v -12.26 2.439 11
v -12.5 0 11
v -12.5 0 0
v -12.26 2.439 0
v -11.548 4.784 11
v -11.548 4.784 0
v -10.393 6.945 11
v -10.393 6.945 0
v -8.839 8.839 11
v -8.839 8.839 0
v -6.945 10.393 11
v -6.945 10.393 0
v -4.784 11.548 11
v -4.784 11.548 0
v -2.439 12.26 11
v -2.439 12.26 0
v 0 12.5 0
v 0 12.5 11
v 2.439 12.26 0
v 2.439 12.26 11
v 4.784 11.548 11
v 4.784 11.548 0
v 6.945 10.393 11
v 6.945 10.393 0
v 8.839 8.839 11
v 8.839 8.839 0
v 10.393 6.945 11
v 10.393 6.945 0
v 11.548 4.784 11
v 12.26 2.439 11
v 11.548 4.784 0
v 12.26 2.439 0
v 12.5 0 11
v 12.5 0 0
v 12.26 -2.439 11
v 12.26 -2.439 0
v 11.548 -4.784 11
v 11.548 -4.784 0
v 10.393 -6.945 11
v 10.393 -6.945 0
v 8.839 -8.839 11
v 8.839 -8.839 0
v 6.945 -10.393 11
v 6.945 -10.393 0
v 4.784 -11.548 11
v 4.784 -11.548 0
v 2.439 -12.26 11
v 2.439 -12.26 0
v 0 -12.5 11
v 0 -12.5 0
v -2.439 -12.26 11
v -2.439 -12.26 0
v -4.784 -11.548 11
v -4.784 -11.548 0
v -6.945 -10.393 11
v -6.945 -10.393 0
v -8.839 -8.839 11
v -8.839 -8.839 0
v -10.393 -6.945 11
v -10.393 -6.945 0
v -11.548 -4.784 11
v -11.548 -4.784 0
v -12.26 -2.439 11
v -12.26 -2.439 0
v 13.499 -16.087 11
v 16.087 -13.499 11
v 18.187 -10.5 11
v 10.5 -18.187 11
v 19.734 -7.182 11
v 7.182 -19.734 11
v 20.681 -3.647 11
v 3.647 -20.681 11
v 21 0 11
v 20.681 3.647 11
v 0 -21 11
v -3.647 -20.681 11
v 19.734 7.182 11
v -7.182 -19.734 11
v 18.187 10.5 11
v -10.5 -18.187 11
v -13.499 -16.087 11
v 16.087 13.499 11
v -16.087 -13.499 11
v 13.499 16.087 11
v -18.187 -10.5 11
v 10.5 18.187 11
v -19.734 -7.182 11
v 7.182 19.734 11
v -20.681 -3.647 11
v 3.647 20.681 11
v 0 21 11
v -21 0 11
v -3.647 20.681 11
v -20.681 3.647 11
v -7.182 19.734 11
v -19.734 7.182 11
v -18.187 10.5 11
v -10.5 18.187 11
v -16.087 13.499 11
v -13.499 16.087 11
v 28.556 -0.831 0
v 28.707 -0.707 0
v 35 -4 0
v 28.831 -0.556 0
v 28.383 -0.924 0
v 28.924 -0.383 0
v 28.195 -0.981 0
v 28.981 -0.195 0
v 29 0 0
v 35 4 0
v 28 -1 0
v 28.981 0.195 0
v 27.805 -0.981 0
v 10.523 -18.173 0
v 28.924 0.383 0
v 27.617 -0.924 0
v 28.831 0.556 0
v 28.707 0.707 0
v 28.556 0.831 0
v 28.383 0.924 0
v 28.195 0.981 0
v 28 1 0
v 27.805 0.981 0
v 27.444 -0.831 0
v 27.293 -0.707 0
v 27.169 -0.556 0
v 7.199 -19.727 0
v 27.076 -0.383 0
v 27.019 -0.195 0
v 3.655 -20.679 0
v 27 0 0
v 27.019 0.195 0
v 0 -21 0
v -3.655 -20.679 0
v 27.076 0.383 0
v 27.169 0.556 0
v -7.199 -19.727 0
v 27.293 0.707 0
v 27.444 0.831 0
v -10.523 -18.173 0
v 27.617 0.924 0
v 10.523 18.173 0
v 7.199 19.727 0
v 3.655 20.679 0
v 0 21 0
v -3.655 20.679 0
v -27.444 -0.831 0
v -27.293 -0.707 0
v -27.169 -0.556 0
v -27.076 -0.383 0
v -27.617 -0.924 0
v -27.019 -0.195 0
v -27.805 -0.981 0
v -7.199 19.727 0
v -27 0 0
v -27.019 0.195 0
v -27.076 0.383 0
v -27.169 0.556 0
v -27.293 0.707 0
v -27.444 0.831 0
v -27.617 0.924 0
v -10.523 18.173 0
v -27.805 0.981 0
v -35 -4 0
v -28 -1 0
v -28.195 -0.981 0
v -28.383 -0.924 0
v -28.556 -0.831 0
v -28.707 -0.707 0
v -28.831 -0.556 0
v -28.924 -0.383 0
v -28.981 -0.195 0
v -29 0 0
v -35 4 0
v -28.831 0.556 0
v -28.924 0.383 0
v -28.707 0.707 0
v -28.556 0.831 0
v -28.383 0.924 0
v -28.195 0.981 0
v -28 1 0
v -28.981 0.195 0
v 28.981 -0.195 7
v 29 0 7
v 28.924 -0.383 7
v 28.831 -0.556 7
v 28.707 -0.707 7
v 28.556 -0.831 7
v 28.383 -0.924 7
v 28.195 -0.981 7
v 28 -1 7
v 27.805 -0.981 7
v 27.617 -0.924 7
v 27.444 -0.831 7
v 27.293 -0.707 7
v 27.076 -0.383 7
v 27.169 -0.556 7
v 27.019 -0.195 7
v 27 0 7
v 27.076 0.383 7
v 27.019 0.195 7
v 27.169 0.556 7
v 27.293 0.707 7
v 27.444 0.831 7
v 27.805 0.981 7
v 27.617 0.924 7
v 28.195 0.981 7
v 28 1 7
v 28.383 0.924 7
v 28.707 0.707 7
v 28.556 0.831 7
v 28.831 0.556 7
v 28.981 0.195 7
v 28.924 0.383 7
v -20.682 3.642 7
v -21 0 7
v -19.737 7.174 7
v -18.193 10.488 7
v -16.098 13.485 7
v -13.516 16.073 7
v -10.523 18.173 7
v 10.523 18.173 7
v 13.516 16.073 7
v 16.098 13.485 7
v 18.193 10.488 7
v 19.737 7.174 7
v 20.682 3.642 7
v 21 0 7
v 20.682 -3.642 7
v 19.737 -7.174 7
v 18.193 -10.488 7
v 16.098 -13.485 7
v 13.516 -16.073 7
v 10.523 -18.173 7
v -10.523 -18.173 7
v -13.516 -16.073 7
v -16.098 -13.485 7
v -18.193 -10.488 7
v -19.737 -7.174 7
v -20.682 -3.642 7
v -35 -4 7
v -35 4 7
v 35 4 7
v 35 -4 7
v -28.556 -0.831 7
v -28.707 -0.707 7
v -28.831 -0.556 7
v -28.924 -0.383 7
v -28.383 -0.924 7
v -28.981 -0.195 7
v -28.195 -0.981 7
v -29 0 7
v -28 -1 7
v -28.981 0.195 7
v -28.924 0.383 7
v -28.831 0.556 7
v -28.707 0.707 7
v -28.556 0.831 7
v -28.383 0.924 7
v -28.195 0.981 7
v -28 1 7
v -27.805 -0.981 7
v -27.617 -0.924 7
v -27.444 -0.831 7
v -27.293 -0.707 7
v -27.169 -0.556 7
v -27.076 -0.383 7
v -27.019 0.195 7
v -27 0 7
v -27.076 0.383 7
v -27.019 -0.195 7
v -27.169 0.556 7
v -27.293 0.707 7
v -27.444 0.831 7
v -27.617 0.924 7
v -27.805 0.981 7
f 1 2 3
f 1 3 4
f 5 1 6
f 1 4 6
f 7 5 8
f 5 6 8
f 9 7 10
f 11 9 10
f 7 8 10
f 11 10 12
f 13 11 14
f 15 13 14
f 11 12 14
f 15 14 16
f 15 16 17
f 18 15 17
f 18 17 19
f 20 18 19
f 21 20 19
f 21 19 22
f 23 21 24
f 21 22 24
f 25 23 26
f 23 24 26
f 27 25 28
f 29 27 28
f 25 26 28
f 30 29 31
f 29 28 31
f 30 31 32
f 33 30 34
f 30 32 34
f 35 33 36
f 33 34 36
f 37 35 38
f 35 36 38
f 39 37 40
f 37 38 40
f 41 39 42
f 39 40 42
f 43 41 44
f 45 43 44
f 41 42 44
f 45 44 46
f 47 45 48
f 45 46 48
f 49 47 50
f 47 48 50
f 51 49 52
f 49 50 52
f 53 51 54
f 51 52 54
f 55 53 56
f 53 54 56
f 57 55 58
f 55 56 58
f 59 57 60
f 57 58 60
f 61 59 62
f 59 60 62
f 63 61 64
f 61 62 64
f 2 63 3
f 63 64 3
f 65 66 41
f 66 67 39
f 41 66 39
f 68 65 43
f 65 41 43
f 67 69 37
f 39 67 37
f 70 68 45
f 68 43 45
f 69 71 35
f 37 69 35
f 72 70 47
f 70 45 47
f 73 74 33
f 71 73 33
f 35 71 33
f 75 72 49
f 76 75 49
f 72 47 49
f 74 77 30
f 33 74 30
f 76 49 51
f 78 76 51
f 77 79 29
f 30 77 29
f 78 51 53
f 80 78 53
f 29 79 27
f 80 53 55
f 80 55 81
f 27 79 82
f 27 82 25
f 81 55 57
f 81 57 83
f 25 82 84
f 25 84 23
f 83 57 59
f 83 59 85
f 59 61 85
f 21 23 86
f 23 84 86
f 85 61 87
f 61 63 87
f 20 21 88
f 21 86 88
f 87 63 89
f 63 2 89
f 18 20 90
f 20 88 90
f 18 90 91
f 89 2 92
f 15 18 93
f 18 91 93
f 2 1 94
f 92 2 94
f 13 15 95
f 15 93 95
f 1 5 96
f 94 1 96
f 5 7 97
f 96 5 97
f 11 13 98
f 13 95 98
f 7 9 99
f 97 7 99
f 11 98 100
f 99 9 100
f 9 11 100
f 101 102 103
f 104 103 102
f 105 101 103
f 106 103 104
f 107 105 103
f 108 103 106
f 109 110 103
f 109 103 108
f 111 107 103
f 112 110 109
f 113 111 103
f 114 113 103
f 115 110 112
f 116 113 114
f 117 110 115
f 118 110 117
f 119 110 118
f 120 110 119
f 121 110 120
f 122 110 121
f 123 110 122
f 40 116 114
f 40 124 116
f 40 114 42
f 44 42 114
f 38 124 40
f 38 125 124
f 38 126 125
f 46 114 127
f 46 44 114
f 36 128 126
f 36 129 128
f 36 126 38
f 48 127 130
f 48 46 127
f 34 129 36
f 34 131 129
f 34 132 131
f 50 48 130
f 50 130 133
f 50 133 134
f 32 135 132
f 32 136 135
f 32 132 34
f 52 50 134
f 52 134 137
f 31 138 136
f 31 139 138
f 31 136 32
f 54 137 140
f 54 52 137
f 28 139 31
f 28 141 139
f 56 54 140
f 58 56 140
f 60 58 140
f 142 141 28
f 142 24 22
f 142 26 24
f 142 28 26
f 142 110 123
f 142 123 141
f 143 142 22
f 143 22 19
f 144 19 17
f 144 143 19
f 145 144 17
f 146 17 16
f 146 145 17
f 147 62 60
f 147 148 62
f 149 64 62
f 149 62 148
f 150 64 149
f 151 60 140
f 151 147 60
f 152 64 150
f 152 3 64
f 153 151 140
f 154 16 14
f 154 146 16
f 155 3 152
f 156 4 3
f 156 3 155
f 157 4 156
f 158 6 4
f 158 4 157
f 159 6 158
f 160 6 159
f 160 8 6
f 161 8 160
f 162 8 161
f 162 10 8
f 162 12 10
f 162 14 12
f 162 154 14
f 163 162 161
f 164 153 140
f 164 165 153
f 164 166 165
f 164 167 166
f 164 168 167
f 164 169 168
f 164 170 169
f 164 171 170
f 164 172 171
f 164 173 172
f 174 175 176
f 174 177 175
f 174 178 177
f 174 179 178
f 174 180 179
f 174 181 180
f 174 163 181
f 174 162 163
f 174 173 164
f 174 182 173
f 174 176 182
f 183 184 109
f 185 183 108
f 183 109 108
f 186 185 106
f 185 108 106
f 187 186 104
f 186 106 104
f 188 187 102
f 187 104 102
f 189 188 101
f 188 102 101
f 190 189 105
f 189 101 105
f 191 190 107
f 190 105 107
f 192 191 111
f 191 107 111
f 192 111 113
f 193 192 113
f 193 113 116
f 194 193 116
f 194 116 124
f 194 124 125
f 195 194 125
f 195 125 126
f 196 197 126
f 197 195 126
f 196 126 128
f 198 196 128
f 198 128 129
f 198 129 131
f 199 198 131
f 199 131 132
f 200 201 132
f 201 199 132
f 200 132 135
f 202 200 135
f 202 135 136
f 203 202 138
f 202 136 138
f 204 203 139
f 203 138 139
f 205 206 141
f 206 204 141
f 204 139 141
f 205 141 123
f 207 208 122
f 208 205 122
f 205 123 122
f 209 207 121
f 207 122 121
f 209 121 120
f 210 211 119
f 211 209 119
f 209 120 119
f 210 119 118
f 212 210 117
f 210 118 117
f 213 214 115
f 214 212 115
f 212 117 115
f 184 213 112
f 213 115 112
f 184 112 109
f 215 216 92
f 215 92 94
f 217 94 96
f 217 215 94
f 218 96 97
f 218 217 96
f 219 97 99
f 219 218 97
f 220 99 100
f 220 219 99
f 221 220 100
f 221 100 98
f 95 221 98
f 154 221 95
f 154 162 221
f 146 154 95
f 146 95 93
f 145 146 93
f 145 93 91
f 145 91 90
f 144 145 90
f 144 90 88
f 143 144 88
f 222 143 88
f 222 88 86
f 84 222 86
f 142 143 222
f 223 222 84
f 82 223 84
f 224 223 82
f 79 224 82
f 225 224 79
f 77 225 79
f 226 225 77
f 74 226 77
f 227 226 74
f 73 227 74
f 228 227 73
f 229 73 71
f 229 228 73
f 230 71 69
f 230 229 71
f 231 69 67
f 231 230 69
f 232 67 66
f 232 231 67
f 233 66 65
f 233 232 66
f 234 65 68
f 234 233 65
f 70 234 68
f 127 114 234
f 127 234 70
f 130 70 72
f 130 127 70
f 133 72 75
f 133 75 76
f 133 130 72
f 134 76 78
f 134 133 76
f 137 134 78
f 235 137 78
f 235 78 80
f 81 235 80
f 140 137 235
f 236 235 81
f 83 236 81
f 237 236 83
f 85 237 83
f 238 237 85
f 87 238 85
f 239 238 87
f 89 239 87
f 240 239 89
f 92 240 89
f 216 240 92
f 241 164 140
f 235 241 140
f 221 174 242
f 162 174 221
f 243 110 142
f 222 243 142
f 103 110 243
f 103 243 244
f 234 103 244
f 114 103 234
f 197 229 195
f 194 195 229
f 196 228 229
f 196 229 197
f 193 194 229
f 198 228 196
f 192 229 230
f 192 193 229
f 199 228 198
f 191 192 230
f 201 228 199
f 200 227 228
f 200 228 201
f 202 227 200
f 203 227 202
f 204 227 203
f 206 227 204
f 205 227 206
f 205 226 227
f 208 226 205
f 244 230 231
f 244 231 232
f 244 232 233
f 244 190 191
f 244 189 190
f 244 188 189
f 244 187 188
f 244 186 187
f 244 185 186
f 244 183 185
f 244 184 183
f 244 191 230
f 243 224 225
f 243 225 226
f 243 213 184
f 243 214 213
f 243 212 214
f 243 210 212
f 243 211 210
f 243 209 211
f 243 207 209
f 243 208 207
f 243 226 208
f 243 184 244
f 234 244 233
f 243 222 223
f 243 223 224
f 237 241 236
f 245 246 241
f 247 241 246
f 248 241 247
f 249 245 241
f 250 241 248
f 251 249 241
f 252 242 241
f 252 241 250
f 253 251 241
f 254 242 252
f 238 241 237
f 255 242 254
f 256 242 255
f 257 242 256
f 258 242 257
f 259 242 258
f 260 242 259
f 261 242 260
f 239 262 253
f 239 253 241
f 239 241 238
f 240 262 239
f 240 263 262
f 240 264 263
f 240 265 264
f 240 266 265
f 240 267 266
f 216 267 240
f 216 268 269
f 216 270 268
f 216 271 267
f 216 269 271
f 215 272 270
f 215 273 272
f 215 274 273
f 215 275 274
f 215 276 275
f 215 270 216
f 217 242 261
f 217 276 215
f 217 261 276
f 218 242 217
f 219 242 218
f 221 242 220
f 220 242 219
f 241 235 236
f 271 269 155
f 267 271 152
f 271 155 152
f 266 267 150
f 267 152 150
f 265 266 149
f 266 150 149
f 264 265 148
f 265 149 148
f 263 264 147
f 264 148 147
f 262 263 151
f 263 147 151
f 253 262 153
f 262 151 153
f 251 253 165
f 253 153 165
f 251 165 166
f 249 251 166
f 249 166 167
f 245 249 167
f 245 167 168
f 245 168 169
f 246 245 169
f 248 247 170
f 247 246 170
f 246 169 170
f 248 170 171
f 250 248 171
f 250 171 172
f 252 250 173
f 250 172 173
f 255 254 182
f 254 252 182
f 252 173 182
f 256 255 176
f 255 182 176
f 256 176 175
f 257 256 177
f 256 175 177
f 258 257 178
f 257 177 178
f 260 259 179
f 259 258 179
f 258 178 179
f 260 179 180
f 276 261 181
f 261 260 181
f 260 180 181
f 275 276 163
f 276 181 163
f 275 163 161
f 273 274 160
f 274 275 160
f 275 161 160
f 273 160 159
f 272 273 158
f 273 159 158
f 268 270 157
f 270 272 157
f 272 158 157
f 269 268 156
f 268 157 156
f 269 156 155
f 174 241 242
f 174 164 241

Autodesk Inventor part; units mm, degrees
ref_plane "YZ Plane" through (0, 0, 0) normal (1, 0, 0) x (0, 1, 0)
ref_plane "XZ Plane" through (0, 0, 0) normal (0, 1, 0) x (-1, 0, 0)
ref_plane "XY Plane" through (0, 0, 0) normal (0, 0, 1) x (1, 0, 0)
sketch "Sketch1" plane through (0, 0, 0) normal (0, 0, 1) x (1, 0, 0)
  circle A0 centre (0, 0) radius 12.5
  circle A1 centre (0, 0) radius 21
  line L0 (0, 0) -> (-28, 0)
  line L1 (0, 0) -> (28, 0)
  circle A2 centre (-28, 0) radius 1
  circle A3 centre (28, 0) radius 1
  line L2 (0, 0) -> (-35, 0)
  line L3 (0, 0) -> (35, 0)
  line L4 (-35, -4) -> (-35, 4)
  line L5 (35, 4) -> (35, -4)
  line L6 (-35, 4) -> (-10.5231, 18.1732)
  line L7 (-35, -4) -> (-10.5231, -18.1732)
  line L8 (35, 4) -> (10.5231, 18.1732)
  line L9 (35, -4) -> (10.5231, -18.1732)
  dimension "d0" = 25
  dimension "d1" = 42
  dimension "d2" = 28
  dimension "d3" = 28
  dimension "d4" = 2
  dimension "d5" = 2
  dimension "d6" = 35
  dimension "d7" = 35
  dimension "d8" = 8
  dimension "d9" = 4
  dimension "d10" = 8
  dimension "d11" = 4
extrude "Extrusion1" add sketch "Sketch1" along normal blind 7 contours L1 A3 L3 L5 L9 A1 | A1 L8 L5 L3 A3 L1 | L0 A2 L2 L4 L6 A1 | A1 L7 L4 L2 A2 L0
sketch "Sketch2" plane through (0, 0, 0) normal (0, 0, -1) x (-1, 0, 0)
  circle A0 centre (0, 0) radius 21
  circle A1 centre (0, 0) radius 12.5
  dimension "d14" = 25
extrude "Extrusion2" add sketch "Sketch2" against normal blind 11
equation "\"d9\" = 0.5 * d8"
equation "\"d11\" = 0.5 * d10"
properties part number "PneumaticHolder"
